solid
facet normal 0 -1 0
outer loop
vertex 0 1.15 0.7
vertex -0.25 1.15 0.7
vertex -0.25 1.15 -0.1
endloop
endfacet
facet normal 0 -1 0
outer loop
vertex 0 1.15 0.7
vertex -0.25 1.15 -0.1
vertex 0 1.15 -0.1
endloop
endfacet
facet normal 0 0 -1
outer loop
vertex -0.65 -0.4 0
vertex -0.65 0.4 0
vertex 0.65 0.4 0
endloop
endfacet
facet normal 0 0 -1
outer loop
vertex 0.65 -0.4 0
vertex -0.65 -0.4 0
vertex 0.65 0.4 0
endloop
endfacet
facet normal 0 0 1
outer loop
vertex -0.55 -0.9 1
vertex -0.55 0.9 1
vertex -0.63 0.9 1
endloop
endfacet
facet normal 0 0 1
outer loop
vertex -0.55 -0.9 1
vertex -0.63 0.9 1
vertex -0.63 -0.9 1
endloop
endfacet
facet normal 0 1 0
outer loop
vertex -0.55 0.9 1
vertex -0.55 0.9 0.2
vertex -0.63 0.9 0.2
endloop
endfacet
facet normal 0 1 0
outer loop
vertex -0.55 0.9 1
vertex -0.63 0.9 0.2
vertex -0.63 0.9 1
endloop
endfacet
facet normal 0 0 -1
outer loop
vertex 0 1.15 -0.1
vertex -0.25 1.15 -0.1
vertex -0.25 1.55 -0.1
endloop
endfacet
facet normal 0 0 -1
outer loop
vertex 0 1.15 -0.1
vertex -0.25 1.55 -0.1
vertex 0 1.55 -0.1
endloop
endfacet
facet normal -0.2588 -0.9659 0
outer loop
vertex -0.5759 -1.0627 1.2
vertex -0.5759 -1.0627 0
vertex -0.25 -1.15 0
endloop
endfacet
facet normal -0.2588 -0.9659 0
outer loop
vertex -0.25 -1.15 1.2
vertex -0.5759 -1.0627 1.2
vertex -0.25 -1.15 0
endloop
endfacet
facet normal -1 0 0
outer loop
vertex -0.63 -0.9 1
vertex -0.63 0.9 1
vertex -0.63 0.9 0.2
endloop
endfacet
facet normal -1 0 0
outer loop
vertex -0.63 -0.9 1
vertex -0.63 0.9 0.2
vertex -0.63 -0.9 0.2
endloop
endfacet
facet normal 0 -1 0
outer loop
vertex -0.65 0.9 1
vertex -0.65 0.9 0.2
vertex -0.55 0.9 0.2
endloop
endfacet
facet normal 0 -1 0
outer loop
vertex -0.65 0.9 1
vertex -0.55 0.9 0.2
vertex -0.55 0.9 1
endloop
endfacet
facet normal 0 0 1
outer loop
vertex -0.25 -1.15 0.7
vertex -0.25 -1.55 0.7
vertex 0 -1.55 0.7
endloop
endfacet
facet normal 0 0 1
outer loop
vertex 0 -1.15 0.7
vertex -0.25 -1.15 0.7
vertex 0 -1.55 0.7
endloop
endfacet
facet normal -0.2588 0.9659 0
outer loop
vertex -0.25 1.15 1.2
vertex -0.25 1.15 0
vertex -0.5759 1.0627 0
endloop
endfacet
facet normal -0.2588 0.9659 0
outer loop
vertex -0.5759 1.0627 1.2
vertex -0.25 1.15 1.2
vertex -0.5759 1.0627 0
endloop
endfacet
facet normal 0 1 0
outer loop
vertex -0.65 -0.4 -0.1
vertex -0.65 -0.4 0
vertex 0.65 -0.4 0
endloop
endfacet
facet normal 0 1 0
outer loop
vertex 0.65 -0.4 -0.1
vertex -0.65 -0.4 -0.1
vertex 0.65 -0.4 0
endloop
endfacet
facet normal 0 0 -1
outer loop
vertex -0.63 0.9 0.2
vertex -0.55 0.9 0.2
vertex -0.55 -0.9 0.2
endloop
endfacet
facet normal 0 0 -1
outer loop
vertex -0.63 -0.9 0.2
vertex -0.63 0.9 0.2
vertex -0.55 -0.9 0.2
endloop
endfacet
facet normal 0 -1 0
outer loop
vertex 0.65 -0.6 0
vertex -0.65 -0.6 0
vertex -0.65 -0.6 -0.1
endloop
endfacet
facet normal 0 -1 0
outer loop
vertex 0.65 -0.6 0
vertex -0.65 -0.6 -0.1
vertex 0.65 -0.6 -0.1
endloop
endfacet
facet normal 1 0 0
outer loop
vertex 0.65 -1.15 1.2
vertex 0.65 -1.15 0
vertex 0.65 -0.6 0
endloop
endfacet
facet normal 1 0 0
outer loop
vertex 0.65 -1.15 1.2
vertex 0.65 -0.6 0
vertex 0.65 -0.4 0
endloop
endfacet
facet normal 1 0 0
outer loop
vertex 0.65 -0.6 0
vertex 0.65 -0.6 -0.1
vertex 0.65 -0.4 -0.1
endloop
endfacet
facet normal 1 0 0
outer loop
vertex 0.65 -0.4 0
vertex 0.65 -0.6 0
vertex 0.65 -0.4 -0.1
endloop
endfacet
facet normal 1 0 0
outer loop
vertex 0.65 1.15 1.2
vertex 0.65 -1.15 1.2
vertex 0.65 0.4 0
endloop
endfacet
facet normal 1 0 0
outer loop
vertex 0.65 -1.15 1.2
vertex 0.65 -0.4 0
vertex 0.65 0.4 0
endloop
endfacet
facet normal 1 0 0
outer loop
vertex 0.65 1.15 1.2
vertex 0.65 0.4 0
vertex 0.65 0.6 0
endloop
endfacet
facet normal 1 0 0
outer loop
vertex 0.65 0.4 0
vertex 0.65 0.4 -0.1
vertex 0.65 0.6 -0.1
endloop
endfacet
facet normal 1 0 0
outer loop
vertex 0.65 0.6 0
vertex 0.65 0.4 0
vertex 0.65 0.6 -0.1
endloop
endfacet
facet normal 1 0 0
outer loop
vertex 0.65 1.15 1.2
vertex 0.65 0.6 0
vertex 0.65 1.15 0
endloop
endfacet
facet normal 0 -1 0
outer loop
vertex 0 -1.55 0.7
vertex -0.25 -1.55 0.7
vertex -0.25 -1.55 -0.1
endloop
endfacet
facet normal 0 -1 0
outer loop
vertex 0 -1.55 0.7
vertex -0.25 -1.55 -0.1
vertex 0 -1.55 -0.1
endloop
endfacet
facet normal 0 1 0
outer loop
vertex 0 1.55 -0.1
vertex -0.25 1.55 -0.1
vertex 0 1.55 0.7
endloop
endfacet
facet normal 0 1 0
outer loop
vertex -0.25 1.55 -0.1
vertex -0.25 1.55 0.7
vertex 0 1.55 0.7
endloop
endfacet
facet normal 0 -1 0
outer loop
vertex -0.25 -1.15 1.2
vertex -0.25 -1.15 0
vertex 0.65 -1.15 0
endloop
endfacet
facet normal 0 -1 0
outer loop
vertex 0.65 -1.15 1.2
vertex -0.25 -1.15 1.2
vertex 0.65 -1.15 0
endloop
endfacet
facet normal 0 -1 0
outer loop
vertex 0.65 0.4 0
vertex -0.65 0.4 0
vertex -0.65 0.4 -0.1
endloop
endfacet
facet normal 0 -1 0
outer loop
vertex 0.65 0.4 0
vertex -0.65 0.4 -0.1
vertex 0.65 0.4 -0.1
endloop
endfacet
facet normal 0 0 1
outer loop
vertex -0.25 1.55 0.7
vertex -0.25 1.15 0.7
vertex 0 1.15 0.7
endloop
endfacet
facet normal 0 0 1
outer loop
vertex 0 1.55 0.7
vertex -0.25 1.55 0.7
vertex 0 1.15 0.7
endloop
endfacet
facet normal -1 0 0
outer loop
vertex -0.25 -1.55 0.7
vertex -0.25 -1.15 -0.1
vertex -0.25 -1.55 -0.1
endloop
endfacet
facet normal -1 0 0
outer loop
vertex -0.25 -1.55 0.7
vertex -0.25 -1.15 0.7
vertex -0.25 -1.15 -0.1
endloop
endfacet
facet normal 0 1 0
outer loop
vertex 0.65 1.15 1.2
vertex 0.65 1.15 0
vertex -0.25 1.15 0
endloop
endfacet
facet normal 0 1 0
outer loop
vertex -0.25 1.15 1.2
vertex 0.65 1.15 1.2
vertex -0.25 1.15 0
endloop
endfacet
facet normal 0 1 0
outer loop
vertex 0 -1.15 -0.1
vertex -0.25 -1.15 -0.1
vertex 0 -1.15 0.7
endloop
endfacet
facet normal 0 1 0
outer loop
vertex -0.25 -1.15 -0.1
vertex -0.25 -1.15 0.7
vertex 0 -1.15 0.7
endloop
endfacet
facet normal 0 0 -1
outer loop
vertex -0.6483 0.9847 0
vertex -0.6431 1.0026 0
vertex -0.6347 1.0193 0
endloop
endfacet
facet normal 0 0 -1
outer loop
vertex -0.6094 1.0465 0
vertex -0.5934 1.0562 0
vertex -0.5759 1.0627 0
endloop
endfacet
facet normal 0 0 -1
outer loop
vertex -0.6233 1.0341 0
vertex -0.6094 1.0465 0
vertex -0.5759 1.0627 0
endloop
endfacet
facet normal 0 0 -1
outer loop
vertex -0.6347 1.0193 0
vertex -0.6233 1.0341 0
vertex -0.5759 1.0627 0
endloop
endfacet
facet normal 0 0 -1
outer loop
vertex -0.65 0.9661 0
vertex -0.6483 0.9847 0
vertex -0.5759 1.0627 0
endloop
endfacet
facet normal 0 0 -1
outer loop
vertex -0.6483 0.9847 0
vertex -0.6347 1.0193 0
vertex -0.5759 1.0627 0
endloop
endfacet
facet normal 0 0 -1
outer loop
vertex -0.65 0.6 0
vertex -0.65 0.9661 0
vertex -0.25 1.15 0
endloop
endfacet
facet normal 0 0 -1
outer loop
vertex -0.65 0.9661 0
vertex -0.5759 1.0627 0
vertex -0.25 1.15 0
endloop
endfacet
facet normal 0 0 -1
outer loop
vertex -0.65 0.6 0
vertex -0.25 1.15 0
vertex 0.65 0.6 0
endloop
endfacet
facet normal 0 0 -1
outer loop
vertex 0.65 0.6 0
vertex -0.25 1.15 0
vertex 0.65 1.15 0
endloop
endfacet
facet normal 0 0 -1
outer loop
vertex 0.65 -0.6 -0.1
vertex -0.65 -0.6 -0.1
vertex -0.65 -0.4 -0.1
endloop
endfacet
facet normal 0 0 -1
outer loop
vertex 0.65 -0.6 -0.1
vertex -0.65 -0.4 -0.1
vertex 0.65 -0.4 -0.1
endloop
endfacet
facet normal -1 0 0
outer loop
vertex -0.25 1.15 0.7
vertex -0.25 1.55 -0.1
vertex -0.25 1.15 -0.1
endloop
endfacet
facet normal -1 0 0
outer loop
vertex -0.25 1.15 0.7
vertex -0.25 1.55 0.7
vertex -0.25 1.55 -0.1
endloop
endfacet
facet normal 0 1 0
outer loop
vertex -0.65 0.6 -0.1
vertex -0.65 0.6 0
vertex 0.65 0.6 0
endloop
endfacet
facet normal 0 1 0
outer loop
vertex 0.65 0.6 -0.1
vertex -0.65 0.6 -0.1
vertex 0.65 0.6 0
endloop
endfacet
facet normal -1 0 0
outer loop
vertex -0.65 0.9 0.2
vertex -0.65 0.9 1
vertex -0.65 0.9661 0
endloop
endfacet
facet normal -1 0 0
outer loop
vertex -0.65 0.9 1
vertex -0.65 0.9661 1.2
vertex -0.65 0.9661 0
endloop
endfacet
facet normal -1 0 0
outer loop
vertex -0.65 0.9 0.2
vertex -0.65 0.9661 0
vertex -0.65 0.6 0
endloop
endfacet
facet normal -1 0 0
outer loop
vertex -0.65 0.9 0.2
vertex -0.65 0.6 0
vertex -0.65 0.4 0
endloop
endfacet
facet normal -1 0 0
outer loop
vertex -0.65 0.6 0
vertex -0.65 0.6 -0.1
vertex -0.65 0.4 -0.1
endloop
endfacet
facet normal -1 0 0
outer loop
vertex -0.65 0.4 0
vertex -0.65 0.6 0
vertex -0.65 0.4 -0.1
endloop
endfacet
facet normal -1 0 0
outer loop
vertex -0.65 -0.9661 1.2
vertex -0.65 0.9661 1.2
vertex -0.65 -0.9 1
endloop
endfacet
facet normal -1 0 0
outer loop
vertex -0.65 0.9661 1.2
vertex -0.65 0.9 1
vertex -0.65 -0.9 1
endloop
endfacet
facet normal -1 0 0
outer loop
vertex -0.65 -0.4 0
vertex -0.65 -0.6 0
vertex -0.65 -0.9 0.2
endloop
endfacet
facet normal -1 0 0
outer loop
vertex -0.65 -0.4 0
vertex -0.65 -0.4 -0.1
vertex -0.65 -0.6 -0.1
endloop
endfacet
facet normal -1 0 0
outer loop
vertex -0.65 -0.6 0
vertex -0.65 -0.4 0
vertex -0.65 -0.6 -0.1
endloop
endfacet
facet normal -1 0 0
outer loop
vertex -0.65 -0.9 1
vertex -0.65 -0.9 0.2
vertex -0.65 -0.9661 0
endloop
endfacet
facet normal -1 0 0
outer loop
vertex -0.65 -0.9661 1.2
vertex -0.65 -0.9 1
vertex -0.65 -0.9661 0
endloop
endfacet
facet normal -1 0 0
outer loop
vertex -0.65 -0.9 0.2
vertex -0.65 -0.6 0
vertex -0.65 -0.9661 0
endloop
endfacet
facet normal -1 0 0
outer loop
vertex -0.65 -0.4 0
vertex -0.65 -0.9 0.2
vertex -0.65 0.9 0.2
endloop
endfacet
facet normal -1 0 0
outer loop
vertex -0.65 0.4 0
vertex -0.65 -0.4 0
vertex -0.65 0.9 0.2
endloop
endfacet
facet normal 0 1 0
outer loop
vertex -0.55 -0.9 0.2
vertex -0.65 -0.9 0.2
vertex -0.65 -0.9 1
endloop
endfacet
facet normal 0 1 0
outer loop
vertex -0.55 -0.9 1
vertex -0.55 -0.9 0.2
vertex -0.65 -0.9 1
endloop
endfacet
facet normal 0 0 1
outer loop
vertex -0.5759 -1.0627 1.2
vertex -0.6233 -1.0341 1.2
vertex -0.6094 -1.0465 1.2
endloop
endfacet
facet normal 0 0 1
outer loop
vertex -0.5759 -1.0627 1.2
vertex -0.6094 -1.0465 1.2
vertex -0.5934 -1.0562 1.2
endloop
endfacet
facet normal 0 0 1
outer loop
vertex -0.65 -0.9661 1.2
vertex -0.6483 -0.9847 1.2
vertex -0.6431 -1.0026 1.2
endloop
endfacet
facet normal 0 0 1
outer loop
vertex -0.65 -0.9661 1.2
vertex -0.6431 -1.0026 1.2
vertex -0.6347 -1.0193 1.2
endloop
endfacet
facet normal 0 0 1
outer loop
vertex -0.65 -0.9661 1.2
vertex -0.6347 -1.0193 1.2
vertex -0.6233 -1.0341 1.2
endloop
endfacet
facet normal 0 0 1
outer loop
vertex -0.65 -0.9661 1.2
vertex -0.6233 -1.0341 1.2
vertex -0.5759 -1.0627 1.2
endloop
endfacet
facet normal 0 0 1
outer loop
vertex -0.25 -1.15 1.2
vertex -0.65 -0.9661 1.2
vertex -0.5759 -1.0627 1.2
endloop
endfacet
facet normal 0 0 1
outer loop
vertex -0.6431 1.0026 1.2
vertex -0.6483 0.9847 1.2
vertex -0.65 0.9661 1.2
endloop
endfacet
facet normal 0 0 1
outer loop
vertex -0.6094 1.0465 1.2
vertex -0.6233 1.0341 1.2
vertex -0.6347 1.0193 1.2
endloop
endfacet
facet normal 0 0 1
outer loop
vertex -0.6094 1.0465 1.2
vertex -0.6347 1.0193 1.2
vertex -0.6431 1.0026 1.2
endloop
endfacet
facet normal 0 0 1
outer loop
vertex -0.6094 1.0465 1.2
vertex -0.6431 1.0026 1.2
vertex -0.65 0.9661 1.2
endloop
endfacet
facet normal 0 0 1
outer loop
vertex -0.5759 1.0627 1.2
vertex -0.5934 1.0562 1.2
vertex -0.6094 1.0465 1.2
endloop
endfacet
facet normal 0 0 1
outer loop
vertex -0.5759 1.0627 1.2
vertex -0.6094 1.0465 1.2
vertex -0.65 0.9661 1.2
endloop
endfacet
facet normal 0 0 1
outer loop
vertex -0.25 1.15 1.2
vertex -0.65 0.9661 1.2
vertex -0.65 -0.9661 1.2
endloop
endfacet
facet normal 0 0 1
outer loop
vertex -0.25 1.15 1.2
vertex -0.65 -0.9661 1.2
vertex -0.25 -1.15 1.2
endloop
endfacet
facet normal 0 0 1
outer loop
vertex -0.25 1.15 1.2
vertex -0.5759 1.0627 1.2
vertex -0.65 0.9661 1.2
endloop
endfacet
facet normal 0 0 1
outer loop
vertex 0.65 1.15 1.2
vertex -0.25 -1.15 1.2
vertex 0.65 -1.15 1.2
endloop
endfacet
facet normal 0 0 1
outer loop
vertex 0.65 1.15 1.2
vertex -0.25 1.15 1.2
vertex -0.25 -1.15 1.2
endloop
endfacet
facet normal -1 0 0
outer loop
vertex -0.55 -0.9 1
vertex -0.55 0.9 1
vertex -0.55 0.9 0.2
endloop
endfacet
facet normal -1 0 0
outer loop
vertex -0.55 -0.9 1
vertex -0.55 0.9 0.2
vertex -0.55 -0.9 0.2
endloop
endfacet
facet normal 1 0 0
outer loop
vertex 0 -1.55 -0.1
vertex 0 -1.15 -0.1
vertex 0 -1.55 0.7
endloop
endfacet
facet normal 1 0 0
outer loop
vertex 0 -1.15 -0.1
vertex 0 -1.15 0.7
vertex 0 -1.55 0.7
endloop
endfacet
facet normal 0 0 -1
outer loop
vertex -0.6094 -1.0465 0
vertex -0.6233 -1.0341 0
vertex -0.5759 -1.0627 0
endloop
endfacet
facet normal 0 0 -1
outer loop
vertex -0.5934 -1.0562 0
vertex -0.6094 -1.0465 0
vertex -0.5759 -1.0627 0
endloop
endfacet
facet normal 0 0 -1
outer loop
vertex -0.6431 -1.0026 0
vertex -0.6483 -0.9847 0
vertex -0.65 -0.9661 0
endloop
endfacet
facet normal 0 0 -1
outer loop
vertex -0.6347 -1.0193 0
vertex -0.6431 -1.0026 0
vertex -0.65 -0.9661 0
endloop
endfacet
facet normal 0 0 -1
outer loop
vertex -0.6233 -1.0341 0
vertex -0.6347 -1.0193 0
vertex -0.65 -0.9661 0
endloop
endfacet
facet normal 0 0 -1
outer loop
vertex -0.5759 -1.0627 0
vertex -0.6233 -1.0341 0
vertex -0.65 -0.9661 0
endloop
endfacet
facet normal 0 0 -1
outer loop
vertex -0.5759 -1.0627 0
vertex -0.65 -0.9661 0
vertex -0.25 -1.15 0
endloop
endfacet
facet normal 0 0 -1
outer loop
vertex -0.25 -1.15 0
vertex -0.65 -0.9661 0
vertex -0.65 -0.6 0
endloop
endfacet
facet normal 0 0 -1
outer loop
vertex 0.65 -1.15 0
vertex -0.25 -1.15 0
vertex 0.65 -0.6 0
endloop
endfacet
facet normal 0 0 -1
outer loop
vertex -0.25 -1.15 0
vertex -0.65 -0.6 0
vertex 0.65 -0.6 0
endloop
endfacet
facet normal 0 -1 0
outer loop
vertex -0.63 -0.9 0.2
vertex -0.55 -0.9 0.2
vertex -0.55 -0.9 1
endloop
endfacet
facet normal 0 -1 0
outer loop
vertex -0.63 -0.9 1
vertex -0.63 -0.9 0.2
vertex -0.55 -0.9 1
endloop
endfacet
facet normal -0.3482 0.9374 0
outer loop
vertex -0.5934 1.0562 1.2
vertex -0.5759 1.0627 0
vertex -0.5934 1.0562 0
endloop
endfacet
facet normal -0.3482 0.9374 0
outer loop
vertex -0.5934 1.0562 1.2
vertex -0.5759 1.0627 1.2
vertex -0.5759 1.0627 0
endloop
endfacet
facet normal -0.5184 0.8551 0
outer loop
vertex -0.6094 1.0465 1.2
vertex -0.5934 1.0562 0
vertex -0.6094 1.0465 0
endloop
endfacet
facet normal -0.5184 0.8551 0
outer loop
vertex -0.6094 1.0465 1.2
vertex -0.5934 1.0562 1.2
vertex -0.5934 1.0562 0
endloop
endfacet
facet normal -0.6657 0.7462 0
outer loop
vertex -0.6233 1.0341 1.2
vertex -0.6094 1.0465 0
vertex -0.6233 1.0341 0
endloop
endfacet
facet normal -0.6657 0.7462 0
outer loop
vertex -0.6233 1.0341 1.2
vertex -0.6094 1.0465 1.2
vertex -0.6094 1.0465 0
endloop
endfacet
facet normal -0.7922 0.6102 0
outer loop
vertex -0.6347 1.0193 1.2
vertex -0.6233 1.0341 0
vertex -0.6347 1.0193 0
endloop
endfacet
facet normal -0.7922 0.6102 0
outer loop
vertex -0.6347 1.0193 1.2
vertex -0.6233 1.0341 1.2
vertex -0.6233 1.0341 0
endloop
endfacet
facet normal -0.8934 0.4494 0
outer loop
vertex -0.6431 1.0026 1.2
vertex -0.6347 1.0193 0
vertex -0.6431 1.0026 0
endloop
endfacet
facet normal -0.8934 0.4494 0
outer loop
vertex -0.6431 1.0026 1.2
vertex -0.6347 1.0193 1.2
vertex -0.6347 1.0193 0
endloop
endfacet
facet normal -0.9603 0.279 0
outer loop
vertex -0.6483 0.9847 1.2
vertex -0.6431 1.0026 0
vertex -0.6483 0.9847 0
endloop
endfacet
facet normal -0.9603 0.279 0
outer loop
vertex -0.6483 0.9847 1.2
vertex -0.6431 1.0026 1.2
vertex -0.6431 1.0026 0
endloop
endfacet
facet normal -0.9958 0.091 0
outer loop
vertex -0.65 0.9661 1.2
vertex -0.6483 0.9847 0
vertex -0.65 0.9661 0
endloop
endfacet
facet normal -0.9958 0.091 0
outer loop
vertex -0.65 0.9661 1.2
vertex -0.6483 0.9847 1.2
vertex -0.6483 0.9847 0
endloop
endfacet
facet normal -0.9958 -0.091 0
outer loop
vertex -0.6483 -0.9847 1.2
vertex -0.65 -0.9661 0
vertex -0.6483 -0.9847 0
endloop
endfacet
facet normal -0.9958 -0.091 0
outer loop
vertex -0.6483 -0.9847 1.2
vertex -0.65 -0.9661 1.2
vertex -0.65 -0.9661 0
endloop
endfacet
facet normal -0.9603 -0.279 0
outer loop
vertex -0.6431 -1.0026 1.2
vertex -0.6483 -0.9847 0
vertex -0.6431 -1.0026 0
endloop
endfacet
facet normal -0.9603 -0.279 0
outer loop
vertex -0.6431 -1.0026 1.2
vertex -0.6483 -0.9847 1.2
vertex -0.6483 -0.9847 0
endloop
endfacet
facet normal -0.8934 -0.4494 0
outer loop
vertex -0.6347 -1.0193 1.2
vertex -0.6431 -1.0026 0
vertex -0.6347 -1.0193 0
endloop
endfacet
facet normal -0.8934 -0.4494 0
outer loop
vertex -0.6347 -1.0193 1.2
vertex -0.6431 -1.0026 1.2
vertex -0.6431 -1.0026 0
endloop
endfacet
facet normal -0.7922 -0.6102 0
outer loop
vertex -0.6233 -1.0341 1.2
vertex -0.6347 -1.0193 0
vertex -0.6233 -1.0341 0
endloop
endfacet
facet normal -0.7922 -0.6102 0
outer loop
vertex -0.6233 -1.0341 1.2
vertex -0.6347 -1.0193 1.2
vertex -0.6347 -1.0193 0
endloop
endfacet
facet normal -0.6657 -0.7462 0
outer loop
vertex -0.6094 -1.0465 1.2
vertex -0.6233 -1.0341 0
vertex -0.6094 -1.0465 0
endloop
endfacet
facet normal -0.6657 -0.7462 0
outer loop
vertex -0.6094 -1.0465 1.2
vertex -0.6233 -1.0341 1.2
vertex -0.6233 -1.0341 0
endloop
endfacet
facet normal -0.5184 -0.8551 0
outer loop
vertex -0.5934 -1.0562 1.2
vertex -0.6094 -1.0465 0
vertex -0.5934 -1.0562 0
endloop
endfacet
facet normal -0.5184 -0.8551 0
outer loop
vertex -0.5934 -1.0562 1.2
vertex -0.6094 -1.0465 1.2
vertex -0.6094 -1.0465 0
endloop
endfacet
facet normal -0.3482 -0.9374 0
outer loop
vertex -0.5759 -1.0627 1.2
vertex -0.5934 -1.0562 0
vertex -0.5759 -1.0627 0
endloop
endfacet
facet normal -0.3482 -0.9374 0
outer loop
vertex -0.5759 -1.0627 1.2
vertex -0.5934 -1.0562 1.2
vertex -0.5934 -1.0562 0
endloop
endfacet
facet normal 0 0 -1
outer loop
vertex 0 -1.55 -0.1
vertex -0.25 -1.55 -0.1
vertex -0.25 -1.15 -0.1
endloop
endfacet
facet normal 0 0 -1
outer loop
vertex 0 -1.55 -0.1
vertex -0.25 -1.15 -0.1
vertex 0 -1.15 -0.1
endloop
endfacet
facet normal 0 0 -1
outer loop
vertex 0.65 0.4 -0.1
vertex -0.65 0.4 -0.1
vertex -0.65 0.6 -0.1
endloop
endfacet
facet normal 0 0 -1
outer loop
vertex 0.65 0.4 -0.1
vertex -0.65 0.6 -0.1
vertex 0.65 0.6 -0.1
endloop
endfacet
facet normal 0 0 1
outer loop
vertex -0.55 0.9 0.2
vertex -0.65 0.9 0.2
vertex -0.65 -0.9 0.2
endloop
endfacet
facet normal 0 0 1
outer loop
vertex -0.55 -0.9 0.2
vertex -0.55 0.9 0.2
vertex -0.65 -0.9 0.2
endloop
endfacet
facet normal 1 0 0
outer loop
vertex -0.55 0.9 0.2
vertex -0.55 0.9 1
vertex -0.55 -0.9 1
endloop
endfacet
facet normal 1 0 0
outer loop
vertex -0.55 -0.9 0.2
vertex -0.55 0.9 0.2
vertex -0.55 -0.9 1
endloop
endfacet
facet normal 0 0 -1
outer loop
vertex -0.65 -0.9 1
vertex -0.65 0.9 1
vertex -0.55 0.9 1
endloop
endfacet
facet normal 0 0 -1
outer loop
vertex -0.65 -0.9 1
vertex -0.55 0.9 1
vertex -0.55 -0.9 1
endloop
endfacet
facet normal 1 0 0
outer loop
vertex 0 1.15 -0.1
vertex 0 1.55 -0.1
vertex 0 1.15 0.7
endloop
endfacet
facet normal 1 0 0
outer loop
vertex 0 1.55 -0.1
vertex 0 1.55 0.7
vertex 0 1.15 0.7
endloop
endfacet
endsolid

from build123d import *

# Parameters (mm, degrees)
F1_DEPTH      = 1.2
F2_W          = 0.25
F2_H          = 0.4
F3_DEPTH      = 0.7
F3_DEPTH_BACK = 0.1
F4_W          = 1.8
F4_H          = 0.8
F5_DEPTH      = 0.1
F6_W          = 1.8
F6_H          = 0.8
F7_DEPTH      = 0.08
F8_R          = 0.1
F9_W          = 1.3
F9_H          = 0.2
F10_DEPTH     = 0.1


with BuildPart() as f1:
    # F0 (on Top) → F1 (new body)
    with BuildSketch(Plane.XY):
        Polygon((0.65, 1.15), (-0.25, 1.15), (-0.65, 1.042820323), (-0.65, -1.042820323), (-0.25, -1.15), (0.65, -1.15), align=None)
    extrude(amount=F1_DEPTH)

    # F4 (on face) → F5 (cut)
    with BuildSketch(Plane(origin=(-0.65, 0, 0), x_dir=(0, -1, 0), z_dir=(-1, 0, 0))):
        with Locations((0, 0.6)):
            Rectangle(F4_W, F4_H)
    extrude(amount=-F5_DEPTH, mode=Mode.SUBTRACT)

    # F8
    f8_edges = [f1.edges().sort_by_distance(p)[0] for p in [
        (-0.65, -1.04282, 0.6),
        (-0.65, 1.04282, 0.6),
    ]]
    fillet(f8_edges, radius=F8_R)

    # F9 (on face) → F10 (join)
    with BuildSketch(Plane(origin=(0, 0, 0), x_dir=(1, 0, 0), z_dir=(0, 0, -1))):
        with Locations((0, 0.5)):
            Rectangle(F9_W, F9_H)
        with Locations((0, -0.5)):
            Rectangle(F9_W, F9_H)
    extrude(amount=F10_DEPTH)


with BuildPart() as f3:
    # F2 (on face) → F3 (new body, two sides)
    with BuildSketch(Plane(origin=(0, 0, 0), x_dir=(1, 0, 0), z_dir=(0, 0, -1))) as f3_sk:
        with Locations((-0.125, -1.35)):
            Rectangle(F2_W, F2_H)
    extrude(amount=-F3_DEPTH)
    extrude(f3_sk.sketch, amount=F3_DEPTH_BACK)


with BuildPart() as f3b:
    # F2 (on face) → F3, piece 2 (new body, two sides)
    with BuildSketch(Plane(origin=(0, 0, 0), x_dir=(1, 0, 0), z_dir=(0, 0, -1))) as f3_2_sk:
        with Locations((-0.125, 1.35)):
            Rectangle(F2_W, F2_H)
    extrude(amount=-F3_DEPTH)
    extrude(f3_2_sk.sketch, amount=F3_DEPTH_BACK)


with BuildPart() as f7:
    # F6 (on face) → F7 (new body)
    with BuildSketch(Plane(origin=(-0.55, 0, 0), x_dir=(0, -1, 0), z_dir=(-1, 0, 0))):
        with Locations((0, 0.6)):
            Rectangle(F6_W, F6_H)
    extrude(amount=F7_DEPTH)


solid = Compound([f1.part, f3.part, f3b.part, f7.part])
